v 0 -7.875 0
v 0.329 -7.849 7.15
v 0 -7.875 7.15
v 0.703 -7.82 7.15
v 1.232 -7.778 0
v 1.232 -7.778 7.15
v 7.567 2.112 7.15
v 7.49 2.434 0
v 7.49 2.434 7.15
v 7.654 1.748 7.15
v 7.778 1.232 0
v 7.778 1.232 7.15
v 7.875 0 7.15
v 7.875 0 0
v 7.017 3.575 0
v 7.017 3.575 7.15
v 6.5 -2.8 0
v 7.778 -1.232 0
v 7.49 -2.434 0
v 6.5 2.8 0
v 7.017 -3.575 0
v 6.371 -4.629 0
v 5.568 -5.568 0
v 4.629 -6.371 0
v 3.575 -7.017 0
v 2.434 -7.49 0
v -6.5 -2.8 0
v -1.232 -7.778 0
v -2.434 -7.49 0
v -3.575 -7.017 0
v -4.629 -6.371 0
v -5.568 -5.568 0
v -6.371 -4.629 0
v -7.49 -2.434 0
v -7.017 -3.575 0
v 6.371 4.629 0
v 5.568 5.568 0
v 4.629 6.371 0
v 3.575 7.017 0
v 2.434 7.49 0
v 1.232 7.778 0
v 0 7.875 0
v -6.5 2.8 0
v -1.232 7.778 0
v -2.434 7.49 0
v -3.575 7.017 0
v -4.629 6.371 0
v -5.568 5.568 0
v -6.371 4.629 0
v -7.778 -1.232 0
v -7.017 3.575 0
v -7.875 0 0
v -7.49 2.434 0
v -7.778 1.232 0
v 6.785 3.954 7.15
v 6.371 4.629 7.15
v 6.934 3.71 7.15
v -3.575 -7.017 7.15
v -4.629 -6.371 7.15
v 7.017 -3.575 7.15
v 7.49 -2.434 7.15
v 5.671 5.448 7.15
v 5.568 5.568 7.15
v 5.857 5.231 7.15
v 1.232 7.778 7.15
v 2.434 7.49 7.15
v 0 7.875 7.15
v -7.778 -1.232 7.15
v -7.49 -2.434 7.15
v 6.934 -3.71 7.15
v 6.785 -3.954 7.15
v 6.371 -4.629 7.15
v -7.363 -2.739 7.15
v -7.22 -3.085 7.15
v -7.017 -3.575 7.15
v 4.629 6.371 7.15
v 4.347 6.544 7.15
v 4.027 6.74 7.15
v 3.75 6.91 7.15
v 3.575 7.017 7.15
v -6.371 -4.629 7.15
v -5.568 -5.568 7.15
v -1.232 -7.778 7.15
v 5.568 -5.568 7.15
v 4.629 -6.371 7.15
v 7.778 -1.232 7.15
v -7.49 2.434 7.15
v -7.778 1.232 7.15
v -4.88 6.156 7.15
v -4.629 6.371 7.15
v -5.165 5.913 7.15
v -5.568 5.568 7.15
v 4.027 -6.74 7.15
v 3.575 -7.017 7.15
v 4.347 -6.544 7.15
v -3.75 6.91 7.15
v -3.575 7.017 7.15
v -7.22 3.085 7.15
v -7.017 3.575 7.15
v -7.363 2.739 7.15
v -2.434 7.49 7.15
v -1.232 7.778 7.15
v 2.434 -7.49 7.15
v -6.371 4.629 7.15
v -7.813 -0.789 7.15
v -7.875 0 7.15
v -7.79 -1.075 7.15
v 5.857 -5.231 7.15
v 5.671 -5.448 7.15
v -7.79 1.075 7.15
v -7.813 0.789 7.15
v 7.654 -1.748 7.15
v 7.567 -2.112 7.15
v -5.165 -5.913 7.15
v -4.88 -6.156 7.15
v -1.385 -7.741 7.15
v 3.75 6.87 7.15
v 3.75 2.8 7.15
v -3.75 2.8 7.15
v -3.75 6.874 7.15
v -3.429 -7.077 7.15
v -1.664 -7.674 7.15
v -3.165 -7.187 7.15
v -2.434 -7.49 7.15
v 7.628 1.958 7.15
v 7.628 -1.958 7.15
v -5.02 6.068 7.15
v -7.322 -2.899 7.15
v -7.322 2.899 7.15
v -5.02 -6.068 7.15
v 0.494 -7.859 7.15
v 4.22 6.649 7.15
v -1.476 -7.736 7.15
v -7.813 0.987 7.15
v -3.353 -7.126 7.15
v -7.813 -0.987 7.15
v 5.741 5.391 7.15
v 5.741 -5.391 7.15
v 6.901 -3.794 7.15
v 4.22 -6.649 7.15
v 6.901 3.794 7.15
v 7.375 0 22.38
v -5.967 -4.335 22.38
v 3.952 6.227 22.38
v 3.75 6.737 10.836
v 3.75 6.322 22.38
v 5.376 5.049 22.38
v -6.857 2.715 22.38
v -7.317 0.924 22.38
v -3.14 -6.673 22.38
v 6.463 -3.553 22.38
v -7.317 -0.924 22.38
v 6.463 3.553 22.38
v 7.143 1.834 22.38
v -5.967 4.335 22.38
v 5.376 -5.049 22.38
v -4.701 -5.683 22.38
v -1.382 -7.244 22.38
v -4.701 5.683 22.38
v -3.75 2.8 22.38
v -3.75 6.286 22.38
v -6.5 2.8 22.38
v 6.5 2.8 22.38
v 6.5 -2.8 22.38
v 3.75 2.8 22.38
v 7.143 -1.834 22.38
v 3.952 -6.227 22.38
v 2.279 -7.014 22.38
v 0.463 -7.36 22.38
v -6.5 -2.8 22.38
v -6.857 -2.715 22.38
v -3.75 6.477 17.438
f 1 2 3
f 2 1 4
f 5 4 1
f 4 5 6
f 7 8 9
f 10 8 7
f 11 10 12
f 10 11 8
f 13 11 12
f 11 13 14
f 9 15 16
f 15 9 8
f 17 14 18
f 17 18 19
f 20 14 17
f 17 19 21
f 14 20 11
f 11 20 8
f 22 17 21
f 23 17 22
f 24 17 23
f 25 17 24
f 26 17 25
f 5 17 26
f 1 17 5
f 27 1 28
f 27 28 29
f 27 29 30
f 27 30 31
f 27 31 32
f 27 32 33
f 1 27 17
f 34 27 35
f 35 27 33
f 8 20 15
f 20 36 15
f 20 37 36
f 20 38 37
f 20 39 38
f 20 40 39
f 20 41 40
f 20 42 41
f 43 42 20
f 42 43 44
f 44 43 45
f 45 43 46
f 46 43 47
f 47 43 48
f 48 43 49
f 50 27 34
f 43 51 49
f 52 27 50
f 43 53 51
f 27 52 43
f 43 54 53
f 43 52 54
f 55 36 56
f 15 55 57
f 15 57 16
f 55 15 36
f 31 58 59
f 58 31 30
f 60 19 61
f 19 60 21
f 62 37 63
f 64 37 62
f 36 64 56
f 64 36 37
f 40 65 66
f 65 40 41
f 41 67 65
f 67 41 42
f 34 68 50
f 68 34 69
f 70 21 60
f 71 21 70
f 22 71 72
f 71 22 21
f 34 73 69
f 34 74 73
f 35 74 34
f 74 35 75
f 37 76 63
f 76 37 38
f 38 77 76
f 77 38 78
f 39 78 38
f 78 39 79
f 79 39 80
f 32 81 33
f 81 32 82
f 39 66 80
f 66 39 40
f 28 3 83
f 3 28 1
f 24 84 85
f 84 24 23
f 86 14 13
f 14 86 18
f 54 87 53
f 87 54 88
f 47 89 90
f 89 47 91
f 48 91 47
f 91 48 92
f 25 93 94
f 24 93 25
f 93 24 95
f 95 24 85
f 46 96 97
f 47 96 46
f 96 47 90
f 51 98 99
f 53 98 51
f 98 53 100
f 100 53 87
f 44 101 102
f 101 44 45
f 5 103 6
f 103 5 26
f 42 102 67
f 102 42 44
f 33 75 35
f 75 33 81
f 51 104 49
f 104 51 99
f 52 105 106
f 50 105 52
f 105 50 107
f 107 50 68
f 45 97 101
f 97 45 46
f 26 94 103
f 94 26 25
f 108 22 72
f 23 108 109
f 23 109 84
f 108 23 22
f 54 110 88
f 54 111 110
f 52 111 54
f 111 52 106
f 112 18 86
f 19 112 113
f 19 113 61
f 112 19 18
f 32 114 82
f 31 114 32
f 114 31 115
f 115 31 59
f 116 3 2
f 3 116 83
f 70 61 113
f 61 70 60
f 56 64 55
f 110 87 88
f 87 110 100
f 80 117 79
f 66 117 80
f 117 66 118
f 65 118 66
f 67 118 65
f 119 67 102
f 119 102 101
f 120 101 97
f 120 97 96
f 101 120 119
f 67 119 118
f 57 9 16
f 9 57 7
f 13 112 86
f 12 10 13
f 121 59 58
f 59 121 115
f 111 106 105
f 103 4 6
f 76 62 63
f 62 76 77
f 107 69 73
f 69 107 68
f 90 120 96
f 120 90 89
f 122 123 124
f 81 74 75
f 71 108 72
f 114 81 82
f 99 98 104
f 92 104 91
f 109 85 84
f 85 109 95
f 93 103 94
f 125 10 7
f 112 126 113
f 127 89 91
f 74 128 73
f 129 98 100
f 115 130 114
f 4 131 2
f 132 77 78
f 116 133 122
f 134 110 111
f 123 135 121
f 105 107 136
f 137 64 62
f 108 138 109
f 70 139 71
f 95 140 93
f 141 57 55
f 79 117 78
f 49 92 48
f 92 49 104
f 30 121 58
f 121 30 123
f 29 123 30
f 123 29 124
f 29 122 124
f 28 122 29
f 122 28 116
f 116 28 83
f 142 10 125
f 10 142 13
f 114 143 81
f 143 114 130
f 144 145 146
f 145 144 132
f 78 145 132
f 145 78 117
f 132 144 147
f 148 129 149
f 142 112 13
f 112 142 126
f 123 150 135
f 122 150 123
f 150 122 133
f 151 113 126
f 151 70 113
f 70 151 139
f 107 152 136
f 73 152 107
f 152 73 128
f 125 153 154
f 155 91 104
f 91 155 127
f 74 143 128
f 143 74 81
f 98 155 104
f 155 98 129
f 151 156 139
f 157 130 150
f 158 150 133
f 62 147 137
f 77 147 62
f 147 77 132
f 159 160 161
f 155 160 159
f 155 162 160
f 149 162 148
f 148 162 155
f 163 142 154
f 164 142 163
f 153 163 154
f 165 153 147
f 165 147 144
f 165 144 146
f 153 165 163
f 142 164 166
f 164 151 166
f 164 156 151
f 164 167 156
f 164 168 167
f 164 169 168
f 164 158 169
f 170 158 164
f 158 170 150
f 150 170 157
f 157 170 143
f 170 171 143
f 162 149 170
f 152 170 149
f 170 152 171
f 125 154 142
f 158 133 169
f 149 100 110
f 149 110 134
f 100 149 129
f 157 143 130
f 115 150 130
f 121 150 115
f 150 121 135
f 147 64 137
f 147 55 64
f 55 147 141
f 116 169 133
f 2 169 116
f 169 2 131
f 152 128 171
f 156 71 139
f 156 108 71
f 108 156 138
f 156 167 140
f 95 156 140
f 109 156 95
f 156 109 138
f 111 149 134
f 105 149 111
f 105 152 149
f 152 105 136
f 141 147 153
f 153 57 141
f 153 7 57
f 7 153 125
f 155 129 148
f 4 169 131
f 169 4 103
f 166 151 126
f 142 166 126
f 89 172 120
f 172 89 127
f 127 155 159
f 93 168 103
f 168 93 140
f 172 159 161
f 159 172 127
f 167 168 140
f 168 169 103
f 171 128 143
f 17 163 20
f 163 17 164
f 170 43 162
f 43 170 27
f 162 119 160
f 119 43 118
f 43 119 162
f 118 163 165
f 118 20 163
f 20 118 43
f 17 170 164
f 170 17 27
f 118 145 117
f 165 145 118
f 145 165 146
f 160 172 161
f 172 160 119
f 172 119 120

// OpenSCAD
bottom_height = 7.15;
total_height = 22.38;
top_height = total_height - bottom_height ;
base_diameter = 15.75; 
top_diameter = 14.75;

module outer()  {
    cylinder (d=base_diameter, $fn= 40, h=bottom_height);
    translate ([0,0,bottom_height])
        cylinder (r1=base_diameter/2, r2=top_diameter/2, $fn40, h=top_height);
}

module inner(){
    width = 13;
    depth = 5.6;
    color ([0,1,0]) 
        translate([-width/2,-depth/2,0])
            cube ([width,depth,total_height]);
}

module inner2(){
    width = 7.5;
    depth = 6;
    translate([-width/2,depth/3,bottom_height])
        cube([7.5, depth, top_height]);
}


module complete (){
    difference(){
        outer();
        inner();
        inner2();
    }
}
complete();
